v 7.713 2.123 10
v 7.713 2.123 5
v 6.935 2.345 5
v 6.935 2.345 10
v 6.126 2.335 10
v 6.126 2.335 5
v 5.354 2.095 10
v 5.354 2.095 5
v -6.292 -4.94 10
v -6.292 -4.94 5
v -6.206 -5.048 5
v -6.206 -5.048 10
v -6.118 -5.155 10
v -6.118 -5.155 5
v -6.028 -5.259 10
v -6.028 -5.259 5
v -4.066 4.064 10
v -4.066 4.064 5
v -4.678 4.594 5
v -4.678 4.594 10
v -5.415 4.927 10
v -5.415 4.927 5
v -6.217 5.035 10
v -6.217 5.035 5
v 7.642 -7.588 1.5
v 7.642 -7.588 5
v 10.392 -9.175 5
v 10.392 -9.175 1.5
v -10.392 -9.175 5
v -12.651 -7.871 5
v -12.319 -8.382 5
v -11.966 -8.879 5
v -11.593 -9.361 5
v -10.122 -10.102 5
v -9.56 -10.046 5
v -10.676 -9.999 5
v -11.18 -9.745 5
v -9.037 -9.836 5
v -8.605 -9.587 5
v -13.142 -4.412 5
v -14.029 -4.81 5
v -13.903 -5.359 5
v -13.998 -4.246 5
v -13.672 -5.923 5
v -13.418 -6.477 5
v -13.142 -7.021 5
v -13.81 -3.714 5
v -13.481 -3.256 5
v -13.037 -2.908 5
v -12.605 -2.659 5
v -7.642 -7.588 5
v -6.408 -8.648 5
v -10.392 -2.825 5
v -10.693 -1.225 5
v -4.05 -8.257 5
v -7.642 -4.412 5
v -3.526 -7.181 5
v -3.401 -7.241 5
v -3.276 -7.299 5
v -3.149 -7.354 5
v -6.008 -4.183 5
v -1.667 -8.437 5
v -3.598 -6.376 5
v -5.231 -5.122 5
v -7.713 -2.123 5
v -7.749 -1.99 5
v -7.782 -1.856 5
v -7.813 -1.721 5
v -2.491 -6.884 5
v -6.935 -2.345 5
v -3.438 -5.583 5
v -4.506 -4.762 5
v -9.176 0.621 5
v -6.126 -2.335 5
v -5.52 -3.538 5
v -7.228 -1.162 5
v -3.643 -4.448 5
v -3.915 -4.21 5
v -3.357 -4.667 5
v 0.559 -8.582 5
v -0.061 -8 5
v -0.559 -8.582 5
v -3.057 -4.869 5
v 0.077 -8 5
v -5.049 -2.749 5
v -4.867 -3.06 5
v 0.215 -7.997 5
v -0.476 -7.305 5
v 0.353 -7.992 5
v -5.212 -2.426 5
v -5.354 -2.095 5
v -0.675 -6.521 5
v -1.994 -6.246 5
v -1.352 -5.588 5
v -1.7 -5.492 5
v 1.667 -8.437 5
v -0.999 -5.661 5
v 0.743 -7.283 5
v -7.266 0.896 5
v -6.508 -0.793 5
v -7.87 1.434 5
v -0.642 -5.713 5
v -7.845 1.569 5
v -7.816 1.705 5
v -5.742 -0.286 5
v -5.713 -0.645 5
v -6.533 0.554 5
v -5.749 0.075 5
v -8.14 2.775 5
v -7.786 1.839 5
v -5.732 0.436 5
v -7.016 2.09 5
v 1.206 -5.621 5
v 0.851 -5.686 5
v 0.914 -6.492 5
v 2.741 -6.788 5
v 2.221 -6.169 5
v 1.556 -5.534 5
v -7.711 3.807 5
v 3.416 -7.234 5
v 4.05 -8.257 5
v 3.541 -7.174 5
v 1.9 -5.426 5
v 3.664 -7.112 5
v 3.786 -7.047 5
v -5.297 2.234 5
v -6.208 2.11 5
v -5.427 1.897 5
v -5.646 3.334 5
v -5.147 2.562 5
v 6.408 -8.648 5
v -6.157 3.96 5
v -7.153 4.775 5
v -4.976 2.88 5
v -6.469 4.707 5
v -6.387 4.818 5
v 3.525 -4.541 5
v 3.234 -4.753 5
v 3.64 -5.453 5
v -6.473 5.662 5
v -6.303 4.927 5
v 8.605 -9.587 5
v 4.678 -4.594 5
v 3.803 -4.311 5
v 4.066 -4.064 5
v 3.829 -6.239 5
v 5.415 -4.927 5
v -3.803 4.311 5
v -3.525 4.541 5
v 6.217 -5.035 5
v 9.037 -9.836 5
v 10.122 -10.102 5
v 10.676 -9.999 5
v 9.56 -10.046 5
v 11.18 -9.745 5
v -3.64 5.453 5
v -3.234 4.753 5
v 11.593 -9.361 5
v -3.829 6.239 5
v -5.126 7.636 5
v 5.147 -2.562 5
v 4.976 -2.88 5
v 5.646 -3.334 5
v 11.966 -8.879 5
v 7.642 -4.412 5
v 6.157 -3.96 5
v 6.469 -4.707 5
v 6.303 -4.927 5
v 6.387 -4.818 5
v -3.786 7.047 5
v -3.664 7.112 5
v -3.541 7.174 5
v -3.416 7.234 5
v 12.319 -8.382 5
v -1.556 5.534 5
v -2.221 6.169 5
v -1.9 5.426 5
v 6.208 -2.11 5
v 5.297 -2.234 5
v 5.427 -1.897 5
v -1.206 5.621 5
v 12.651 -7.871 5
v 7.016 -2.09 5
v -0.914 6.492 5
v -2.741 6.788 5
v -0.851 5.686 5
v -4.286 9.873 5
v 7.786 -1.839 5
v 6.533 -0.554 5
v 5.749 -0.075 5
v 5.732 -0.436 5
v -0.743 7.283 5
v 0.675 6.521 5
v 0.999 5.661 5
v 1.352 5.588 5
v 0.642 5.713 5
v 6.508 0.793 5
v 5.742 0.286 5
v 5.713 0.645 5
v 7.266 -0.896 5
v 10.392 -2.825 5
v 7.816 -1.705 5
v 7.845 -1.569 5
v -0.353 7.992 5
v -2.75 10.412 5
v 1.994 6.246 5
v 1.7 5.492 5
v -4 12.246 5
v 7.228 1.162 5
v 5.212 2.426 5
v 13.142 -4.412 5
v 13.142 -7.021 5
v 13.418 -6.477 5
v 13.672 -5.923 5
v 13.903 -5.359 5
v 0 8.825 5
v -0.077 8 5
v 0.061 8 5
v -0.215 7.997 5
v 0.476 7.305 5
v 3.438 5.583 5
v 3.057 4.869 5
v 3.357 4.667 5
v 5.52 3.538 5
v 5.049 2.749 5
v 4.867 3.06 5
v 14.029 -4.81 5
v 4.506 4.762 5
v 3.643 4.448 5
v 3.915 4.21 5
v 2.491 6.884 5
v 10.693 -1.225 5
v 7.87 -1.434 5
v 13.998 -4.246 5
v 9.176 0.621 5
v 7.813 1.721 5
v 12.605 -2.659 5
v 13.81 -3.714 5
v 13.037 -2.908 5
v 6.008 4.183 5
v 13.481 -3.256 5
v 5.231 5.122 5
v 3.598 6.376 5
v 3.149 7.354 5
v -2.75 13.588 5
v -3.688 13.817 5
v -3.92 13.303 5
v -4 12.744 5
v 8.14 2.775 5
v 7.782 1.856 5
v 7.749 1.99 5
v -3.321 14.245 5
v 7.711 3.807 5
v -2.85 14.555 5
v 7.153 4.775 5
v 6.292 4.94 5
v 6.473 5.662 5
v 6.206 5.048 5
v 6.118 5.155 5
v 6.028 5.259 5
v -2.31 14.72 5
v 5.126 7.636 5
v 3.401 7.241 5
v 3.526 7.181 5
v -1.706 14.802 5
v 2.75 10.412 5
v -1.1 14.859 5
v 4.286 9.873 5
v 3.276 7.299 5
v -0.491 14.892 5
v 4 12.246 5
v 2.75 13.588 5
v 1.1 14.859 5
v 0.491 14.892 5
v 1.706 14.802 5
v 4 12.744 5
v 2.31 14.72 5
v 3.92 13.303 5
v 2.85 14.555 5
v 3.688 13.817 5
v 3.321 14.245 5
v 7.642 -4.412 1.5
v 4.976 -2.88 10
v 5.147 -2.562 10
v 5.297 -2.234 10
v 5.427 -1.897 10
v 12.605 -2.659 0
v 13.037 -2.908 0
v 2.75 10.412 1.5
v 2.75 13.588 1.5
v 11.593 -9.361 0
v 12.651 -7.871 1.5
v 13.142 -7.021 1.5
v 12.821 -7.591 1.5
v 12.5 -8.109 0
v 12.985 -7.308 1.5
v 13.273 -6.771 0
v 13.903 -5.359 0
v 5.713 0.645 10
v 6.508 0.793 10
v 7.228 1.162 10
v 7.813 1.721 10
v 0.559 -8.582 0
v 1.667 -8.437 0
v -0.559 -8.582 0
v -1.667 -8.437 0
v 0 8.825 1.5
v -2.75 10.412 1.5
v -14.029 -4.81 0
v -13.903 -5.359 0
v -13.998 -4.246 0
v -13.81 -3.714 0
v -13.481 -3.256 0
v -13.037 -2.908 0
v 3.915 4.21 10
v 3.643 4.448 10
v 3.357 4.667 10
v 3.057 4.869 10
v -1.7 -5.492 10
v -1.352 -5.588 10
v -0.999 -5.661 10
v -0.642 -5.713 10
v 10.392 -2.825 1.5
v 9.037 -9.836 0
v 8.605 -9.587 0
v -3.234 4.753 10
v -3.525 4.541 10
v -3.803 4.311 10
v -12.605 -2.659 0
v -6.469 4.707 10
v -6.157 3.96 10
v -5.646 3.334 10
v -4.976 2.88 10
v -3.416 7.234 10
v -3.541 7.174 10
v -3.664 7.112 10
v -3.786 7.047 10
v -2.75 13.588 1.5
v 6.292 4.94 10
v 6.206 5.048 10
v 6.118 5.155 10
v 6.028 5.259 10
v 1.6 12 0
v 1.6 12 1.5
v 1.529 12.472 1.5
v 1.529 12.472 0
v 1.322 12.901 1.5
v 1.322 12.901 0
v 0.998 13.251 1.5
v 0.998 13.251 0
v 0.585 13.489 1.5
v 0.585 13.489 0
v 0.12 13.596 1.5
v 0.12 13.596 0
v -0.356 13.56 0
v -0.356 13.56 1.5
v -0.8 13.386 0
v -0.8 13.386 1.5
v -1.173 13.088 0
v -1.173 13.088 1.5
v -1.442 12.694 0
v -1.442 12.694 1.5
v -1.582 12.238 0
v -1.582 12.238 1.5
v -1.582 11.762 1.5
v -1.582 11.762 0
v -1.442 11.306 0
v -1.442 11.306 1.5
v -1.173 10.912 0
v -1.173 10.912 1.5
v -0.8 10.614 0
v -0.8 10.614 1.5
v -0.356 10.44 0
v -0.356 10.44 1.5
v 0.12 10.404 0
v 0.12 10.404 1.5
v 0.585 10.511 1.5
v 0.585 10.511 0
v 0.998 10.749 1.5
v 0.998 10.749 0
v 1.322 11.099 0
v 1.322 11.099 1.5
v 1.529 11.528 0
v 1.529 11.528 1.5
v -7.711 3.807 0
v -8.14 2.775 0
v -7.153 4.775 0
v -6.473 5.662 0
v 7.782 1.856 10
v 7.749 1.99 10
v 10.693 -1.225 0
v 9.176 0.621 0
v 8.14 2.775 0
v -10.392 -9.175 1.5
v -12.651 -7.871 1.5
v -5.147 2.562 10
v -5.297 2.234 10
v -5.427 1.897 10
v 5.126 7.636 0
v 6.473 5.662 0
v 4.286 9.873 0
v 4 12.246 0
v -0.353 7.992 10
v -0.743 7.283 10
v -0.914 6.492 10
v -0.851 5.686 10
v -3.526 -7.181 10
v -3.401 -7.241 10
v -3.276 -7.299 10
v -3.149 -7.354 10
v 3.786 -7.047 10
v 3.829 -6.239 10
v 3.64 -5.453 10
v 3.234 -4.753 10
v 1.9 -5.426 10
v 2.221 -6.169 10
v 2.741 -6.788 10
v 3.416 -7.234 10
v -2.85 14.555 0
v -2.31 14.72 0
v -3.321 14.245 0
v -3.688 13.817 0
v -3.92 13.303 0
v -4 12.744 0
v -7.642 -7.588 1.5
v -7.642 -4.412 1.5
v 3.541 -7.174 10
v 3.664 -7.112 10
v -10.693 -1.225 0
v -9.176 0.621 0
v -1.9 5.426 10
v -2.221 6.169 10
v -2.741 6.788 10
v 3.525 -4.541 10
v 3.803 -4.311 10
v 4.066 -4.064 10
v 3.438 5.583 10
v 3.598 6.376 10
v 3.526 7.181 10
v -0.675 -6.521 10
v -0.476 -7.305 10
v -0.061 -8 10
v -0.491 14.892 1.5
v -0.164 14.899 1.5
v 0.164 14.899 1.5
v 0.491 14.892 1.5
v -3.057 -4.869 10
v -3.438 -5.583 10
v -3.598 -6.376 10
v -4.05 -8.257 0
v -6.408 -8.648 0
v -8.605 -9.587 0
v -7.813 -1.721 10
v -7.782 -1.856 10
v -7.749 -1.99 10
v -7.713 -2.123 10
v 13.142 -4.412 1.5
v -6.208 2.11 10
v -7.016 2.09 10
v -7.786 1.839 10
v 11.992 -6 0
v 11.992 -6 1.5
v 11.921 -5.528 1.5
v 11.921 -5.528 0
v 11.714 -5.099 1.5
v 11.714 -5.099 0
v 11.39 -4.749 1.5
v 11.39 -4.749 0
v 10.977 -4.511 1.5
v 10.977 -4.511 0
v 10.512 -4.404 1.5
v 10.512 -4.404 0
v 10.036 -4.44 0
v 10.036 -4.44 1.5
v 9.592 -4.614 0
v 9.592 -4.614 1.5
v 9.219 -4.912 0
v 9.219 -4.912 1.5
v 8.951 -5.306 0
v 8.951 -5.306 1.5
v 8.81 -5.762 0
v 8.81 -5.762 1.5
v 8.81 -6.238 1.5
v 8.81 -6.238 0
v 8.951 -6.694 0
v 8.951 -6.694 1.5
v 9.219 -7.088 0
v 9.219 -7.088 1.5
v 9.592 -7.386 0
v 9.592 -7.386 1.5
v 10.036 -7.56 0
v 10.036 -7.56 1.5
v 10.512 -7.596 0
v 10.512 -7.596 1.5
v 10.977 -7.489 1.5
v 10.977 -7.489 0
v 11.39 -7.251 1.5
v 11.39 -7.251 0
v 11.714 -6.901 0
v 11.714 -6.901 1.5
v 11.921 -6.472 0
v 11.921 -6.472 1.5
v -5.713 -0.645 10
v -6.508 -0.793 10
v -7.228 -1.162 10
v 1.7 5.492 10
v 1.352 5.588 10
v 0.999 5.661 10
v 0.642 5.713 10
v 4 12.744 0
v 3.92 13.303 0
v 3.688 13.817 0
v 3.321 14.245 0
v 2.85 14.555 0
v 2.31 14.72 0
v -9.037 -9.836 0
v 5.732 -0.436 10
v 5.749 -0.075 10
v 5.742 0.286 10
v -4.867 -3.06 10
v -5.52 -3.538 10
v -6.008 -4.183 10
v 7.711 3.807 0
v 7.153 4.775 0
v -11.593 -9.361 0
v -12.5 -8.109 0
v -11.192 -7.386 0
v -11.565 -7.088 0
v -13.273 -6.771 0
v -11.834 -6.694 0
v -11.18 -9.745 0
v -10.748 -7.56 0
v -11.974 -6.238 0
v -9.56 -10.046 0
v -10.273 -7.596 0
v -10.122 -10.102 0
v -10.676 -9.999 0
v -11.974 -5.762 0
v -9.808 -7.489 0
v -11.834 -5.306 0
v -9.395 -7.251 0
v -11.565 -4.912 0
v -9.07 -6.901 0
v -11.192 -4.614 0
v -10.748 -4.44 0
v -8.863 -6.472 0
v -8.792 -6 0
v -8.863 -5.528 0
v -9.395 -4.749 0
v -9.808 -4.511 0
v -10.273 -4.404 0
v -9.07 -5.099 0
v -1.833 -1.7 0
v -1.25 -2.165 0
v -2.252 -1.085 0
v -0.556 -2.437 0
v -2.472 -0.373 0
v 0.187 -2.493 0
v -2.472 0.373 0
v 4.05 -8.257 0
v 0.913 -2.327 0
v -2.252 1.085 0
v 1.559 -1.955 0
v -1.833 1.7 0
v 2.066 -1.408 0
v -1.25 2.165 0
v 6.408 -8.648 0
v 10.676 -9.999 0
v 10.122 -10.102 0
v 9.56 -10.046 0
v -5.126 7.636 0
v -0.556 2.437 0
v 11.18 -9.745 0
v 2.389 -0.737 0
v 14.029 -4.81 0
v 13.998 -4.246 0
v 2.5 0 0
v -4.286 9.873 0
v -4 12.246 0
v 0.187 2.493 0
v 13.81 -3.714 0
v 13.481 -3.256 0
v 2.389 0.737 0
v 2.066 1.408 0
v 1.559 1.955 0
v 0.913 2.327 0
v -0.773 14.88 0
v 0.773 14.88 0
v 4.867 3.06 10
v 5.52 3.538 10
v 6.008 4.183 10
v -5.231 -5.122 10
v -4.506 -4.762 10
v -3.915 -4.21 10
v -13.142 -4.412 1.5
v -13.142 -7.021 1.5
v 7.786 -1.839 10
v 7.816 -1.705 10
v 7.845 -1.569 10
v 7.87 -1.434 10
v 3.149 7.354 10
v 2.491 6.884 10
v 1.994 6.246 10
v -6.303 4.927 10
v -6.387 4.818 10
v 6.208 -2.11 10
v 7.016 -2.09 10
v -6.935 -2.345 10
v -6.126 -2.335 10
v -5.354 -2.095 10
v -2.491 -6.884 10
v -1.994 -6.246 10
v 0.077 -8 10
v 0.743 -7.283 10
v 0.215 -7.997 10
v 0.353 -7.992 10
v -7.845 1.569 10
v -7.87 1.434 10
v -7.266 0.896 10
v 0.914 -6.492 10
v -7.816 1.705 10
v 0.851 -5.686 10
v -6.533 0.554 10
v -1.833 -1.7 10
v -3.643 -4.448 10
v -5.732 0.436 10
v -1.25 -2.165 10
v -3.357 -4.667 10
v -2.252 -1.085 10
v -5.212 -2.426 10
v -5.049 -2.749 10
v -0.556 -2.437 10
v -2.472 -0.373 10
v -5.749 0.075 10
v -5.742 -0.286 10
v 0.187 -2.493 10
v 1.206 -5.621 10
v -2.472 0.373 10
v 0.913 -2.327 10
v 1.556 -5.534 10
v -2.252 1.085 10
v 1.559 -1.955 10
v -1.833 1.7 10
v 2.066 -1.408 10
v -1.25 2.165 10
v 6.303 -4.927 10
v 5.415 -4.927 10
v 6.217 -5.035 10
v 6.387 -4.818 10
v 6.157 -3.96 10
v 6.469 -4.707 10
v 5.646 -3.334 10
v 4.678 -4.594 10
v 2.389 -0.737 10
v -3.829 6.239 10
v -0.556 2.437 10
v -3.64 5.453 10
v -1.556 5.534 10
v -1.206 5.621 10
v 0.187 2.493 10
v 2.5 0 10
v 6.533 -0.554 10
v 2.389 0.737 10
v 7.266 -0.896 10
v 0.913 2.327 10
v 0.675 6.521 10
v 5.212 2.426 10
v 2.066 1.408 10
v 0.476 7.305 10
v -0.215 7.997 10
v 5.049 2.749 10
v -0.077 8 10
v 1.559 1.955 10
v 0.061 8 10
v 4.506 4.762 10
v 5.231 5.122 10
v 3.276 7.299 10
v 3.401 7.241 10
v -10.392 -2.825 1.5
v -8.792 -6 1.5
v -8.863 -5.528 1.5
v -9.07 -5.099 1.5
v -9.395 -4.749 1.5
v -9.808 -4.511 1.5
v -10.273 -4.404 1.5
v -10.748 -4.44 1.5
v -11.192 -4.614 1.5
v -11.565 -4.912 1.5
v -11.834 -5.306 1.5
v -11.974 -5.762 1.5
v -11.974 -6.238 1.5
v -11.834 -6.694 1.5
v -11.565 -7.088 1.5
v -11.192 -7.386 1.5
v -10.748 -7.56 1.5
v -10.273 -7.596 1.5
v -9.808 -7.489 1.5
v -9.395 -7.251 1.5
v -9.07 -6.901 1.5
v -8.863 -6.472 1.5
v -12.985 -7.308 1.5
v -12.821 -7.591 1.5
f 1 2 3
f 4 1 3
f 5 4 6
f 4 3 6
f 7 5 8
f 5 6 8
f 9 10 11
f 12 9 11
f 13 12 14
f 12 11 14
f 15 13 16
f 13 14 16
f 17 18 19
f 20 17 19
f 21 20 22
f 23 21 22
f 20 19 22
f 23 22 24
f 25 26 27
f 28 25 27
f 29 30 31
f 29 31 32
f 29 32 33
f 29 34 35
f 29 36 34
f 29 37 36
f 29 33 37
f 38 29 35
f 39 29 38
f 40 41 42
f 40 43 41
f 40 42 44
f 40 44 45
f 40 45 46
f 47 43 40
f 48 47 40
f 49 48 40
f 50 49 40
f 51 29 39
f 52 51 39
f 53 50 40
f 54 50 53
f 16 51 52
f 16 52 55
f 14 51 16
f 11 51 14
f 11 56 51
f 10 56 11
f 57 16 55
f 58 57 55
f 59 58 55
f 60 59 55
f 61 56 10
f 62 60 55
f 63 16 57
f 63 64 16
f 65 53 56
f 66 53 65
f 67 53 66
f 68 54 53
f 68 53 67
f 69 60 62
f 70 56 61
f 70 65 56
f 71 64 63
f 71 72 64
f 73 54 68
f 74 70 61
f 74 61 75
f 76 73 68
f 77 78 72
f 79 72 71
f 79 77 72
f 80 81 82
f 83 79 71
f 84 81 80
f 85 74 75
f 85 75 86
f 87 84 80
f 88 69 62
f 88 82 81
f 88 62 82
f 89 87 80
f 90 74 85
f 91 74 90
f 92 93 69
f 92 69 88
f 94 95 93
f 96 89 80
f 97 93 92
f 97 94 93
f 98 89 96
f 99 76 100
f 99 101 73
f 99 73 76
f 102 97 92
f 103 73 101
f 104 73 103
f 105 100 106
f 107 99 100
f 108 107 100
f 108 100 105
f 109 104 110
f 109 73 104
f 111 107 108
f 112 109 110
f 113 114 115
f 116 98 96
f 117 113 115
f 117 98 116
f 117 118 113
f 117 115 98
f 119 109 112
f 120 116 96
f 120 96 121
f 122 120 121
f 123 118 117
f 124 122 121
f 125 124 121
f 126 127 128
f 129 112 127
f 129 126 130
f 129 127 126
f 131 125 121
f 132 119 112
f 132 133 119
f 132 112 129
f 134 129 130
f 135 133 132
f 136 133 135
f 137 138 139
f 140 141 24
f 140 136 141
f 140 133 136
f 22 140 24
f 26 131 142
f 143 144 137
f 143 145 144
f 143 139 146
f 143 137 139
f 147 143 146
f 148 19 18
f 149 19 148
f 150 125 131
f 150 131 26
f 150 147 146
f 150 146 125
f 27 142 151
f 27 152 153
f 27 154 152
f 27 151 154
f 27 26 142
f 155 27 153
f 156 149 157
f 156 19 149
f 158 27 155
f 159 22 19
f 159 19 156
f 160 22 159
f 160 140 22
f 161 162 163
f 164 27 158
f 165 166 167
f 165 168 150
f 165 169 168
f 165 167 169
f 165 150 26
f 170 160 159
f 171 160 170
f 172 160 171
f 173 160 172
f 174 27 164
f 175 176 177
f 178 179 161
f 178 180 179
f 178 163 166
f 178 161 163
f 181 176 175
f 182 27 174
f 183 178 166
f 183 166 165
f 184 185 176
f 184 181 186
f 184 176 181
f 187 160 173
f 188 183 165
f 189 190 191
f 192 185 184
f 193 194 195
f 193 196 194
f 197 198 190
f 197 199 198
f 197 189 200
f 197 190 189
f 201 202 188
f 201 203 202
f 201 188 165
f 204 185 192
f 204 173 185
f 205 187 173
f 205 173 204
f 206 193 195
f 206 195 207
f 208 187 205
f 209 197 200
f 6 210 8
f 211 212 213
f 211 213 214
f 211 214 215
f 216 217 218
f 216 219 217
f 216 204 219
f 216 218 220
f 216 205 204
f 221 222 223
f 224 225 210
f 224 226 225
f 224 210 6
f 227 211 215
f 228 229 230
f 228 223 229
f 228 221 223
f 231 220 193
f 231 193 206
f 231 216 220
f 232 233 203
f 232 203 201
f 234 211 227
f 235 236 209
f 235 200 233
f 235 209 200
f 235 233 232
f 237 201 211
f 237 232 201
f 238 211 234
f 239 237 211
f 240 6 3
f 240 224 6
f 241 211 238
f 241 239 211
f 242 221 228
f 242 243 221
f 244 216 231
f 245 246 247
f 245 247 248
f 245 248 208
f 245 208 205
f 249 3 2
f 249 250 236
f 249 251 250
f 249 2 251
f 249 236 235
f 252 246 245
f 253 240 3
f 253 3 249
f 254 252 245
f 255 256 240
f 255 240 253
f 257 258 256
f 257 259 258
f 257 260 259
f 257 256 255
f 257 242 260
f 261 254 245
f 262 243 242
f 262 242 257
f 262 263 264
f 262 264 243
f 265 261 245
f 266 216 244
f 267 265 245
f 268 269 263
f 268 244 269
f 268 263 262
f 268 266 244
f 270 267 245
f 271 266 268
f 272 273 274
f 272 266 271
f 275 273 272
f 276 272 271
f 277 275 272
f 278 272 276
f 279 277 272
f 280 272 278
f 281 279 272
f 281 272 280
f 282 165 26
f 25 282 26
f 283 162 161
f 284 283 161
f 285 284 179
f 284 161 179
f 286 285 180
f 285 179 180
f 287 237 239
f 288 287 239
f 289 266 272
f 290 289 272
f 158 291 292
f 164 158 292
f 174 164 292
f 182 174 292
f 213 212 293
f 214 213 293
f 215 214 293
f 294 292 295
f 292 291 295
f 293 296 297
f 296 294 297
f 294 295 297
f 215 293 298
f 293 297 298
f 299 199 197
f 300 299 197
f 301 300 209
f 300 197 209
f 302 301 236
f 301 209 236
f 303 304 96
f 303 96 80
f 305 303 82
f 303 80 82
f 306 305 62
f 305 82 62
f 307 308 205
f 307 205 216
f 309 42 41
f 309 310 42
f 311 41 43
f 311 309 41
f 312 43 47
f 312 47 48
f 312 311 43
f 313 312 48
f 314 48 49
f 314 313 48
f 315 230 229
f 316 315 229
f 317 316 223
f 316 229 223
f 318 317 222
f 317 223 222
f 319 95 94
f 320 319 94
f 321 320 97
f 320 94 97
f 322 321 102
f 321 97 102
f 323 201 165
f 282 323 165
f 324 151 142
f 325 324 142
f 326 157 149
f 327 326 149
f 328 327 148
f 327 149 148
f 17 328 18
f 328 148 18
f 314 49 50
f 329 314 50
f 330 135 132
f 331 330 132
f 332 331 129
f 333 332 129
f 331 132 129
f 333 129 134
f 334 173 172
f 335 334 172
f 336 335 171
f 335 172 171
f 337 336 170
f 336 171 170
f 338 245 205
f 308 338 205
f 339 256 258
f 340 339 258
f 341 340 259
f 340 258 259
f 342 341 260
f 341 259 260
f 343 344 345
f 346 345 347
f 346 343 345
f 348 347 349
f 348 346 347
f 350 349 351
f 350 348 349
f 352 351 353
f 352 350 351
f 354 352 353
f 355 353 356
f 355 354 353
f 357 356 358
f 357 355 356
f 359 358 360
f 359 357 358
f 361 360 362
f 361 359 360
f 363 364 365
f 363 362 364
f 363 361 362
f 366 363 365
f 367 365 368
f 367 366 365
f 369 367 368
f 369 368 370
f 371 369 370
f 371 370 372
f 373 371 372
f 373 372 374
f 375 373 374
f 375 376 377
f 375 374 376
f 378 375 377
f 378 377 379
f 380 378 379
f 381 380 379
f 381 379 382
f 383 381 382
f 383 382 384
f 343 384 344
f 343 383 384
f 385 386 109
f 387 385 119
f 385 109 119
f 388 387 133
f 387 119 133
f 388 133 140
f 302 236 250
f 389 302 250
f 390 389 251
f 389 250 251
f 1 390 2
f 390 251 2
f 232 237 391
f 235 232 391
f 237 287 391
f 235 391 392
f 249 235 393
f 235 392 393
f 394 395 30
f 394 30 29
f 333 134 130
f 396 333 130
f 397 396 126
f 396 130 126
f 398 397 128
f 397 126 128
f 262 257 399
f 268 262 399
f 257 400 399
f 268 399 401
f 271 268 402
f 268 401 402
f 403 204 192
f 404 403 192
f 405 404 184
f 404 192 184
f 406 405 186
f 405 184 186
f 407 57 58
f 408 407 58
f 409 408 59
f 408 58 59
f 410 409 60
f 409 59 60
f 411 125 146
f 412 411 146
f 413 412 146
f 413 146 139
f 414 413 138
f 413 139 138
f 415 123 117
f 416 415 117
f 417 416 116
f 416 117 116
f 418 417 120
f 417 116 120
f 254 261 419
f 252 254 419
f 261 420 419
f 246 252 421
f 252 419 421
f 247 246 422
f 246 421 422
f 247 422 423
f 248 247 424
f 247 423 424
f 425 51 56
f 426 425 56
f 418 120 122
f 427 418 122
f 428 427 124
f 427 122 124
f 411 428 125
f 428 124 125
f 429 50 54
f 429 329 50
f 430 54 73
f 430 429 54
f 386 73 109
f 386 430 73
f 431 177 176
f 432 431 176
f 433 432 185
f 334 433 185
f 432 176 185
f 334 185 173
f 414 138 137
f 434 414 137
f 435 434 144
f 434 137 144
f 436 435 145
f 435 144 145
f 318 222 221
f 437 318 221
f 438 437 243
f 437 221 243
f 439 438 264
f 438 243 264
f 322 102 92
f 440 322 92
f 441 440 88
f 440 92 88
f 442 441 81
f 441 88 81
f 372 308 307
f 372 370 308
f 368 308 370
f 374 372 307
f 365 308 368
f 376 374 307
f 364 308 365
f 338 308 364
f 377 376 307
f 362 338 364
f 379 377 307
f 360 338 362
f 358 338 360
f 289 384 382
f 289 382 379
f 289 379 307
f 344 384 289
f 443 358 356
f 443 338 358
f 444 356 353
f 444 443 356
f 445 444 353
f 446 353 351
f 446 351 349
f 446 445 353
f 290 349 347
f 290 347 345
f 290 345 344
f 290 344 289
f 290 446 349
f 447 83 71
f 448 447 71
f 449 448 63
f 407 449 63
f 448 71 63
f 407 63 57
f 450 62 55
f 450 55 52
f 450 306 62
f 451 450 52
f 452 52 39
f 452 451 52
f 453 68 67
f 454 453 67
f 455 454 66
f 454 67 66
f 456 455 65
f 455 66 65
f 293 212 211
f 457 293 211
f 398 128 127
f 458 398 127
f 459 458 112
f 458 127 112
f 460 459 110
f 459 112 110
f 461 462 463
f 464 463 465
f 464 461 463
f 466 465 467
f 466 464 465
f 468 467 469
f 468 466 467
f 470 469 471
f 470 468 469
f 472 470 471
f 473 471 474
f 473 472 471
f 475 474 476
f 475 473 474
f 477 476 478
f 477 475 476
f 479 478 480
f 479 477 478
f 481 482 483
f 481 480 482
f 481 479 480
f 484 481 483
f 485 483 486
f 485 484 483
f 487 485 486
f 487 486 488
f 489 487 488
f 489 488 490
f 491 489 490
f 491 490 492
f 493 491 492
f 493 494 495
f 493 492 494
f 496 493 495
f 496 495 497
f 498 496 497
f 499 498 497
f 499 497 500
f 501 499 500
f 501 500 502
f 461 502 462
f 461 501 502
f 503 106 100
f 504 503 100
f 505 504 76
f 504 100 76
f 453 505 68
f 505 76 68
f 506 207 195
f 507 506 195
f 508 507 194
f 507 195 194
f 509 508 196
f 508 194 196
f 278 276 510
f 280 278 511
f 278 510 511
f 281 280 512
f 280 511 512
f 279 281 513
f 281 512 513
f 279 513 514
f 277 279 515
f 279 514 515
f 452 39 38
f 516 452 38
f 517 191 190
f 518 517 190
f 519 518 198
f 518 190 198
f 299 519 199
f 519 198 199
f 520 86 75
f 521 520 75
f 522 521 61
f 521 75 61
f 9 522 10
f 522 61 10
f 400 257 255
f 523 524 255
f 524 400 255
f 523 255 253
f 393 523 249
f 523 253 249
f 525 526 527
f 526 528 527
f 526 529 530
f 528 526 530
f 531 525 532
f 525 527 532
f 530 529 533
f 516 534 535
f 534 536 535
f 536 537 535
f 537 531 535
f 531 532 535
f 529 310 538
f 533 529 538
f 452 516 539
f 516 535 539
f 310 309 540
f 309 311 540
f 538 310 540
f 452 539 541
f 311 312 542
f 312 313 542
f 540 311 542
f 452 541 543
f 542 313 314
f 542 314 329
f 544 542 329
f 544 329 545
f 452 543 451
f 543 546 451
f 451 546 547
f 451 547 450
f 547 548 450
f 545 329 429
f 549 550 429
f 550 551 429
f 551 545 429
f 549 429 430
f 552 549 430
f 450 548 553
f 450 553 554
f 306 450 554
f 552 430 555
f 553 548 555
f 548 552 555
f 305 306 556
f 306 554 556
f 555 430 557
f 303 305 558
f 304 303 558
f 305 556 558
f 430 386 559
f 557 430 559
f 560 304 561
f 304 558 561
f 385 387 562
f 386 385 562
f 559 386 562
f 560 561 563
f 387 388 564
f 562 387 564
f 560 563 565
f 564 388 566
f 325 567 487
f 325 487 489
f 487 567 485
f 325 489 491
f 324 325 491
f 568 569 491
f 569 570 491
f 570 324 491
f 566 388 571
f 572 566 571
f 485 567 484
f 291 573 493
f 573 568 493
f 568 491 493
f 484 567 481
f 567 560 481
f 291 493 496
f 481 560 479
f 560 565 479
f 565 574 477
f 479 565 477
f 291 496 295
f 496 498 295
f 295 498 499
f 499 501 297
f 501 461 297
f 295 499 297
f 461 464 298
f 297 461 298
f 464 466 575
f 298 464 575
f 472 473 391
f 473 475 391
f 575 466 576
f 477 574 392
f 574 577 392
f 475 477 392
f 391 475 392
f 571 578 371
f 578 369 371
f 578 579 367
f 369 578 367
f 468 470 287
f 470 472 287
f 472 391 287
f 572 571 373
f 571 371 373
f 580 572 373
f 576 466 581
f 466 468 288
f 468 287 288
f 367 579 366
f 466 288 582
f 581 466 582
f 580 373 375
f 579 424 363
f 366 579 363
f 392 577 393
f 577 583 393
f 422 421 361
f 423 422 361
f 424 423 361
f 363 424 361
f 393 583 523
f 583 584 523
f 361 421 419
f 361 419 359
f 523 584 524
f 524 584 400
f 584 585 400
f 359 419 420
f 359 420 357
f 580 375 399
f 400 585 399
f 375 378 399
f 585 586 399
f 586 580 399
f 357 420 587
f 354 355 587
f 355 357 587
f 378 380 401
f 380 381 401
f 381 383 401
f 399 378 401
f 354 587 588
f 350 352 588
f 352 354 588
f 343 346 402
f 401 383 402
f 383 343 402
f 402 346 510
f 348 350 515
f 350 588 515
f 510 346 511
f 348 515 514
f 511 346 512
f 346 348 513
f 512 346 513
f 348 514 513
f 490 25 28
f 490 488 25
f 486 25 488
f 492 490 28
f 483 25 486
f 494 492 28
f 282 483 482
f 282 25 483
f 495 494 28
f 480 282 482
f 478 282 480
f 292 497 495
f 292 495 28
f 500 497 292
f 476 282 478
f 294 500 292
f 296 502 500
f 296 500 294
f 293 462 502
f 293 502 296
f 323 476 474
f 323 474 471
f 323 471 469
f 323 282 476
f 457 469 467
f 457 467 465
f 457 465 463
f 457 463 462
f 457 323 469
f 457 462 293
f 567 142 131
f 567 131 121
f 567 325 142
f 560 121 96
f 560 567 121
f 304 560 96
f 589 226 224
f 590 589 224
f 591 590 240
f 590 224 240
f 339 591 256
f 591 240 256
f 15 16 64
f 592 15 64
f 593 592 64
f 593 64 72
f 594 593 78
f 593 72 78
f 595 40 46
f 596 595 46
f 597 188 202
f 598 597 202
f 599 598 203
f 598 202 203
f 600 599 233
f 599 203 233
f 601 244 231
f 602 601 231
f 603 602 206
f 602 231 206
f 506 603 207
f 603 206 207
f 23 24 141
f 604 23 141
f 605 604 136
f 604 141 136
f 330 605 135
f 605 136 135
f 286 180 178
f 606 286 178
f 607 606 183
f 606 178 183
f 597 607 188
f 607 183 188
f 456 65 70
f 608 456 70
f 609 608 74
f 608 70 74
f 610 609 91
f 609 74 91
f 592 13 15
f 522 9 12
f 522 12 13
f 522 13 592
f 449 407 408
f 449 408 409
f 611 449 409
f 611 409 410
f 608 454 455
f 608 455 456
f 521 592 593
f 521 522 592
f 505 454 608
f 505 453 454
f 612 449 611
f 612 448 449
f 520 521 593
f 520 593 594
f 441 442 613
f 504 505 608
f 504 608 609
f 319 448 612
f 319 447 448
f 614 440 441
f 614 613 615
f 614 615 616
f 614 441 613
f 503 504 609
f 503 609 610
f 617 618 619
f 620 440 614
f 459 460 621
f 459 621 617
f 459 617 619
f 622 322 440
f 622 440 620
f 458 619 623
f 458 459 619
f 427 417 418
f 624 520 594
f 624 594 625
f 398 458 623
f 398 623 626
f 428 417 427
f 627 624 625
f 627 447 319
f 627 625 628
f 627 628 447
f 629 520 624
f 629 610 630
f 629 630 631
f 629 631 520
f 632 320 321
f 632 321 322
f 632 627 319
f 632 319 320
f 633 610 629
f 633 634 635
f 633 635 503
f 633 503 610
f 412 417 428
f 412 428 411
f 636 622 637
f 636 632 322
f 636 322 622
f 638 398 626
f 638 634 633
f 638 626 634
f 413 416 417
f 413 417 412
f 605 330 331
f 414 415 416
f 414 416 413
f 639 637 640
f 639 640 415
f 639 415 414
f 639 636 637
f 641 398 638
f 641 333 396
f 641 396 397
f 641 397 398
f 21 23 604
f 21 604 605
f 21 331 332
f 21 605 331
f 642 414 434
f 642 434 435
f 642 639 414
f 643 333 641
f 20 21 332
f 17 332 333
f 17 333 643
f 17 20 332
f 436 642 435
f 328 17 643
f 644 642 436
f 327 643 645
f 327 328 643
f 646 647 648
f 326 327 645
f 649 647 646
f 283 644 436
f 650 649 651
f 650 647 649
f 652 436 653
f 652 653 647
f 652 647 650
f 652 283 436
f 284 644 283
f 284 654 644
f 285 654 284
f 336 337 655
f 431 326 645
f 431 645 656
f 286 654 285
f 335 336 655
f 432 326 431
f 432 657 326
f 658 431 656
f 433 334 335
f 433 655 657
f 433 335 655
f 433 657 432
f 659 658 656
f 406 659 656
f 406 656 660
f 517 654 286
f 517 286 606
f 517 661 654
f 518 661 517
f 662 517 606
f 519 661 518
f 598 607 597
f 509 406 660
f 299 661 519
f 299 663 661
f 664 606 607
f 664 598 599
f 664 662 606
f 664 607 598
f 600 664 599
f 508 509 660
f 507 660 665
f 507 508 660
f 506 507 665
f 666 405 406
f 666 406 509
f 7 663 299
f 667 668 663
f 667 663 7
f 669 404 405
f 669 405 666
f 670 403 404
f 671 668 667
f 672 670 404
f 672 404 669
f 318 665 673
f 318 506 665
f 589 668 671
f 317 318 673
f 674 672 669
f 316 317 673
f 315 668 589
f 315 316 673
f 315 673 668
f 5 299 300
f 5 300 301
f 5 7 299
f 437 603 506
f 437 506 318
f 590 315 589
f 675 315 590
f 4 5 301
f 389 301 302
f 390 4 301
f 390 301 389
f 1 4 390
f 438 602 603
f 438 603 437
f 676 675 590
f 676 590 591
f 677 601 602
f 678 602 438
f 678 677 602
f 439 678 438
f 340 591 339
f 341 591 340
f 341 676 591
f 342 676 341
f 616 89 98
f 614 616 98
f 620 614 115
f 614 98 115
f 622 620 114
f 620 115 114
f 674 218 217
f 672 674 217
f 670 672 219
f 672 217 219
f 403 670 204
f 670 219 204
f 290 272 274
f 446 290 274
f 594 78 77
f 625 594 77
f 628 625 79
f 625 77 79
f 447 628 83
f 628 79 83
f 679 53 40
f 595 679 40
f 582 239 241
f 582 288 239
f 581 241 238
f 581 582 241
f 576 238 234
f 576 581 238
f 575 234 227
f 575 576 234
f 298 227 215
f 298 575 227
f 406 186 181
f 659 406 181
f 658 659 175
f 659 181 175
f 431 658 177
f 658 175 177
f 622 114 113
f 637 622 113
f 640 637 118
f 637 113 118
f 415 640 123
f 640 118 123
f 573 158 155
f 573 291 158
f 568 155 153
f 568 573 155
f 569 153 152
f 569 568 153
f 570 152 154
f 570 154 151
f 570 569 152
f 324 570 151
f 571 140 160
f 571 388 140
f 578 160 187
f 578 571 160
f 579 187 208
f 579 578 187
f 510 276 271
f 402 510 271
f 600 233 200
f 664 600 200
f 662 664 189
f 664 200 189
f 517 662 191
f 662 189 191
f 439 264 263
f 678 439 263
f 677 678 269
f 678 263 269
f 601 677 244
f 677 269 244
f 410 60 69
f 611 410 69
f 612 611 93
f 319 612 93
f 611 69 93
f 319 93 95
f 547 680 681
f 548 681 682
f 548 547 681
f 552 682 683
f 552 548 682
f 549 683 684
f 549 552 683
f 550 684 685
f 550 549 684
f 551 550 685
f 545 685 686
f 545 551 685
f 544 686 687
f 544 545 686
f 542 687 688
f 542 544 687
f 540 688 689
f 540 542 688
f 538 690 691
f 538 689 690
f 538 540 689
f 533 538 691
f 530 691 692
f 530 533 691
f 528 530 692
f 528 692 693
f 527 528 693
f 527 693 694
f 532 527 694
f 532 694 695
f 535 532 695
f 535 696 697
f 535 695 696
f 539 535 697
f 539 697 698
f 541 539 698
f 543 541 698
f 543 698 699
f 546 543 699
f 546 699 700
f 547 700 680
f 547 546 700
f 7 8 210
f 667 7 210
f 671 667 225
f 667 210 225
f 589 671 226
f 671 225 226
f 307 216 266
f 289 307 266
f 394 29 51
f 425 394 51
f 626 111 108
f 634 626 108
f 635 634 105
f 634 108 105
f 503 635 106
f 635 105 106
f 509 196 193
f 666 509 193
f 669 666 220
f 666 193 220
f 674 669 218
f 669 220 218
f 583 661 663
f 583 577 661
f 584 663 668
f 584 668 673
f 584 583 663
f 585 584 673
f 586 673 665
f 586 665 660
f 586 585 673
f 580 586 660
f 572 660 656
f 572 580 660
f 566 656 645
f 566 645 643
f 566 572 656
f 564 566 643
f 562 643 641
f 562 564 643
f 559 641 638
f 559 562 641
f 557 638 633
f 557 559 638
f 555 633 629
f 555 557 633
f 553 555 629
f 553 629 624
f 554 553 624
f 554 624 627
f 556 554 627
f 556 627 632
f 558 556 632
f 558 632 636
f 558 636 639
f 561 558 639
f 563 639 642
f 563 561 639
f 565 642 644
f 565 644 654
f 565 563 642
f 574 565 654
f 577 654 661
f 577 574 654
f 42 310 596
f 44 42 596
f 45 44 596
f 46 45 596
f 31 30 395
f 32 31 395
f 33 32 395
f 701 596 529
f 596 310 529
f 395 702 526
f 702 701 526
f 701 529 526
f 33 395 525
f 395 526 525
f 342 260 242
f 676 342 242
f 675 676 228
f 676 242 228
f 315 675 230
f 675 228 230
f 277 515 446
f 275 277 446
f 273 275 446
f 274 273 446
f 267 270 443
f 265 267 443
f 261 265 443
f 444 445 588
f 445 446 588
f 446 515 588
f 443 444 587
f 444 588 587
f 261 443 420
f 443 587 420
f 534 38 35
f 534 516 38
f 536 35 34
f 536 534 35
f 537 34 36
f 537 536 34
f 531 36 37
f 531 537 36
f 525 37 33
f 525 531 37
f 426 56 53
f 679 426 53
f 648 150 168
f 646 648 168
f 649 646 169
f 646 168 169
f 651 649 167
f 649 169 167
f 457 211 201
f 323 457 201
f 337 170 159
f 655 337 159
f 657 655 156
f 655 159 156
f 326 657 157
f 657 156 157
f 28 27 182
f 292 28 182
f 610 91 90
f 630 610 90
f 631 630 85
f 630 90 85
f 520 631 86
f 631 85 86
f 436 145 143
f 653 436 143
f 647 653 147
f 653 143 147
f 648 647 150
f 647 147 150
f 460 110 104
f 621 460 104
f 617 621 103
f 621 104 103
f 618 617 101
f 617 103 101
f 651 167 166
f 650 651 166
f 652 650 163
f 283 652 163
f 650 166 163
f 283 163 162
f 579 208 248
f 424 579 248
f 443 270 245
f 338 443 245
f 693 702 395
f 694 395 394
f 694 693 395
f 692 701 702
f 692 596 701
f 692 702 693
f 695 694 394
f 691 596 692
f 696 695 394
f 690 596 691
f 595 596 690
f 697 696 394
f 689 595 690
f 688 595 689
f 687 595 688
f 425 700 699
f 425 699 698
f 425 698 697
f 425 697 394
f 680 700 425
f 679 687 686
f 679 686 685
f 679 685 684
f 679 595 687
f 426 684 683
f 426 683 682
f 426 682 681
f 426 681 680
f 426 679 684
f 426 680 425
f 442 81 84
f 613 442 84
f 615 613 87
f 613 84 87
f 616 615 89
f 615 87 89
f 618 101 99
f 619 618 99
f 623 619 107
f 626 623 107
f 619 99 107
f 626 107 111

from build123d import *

# Parameters (mm, degrees)
SKETCH1_R           = 14.9
SKETCH1_R_2         = 1.6000000000000003
SKETCH1_R_3         = 1.6000000000006653
SKETCH1_R_4         = 1.6000000000009684
SKETCH1_R_5         = 2.5
BOSS_EXTRUDE1_DEPTH = 5
CUT_EXTRUDE1_DEPTH  = 3.5
CUT_EXTRUDE2_DEPTH  = 22.656869579881576
FILLET1_R           = 10
FILLET2_R           = 2
SKETCH6_R           = 2.4999999999999956
BOSS_EXTRUDE2_DEPTH = 5


with BuildPart() as part:
    # Sketch1 → Boss-Extrude1 (new body)
    with BuildSketch(Plane.XY):
        Circle(SKETCH1_R)
        with Locations((0, 12)):
            Circle(SKETCH1_R_2, mode=Mode.SUBTRACT)
        with Locations((10.392304845414033, -5.99999999999955)):
            Circle(SKETCH1_R_3, mode=Mode.SUBTRACT)
        with Locations((-10.3923048454125, -6.000000000000447)):
            Circle(SKETCH1_R_4, mode=Mode.SUBTRACT)
        Circle(SKETCH1_R_5, mode=Mode.SUBTRACT)
    extrude(amount=BOSS_EXTRUDE1_DEPTH)

    # Sketch2 → Cut-Extrude1 (cut)
    with BuildSketch(Plane.XY.offset(5)):
        Polygon((13.142304845413232, -7.5877132402708165), (13.142304845413246, -4.412286759728591), (10.392304845413825, -2.824573519457418), (7.642304845414409, -4.41228675972855), (7.64230484541441, -7.587713240270817), (10.39230484541382, -9.17542648054195), align=None)
        Polygon((1.342e-14, 15.175426480542264), (-2.749999999999405, 13.58771324027113), (-2.7499999999994076, 10.412286759728874), (9e-15, 8.824573519457736), (2.7499999999994245, 10.41228675972887), (2.7499999999994267, 13.58771324027113), align=None)
        Polygon((-13.14230484541212, -7.587713240271449), (-10.3923048454127, -9.175426480542583), (-7.642304845413332, -7.587713240271399), (-7.642304845413293, -4.412286759729188), (-10.392304845412706, -2.8245735194580552), (-13.142304845412118, -4.4122867597291835), align=None)
    extrude(amount=-CUT_EXTRUDE1_DEPTH, mode=Mode.SUBTRACT)

    # Sketch5 → Cut-Extrude2 (cut, through all)
    with BuildSketch(Plane.XY.offset(5)):
        with BuildLine():
            Line((4, 14.353048456686821), (4, 7.613146524269713))
            ThreePointArc((4, 7.613146524269714), (7.360706487831178, 4.447471191587419), (8.600000000000001, 0))
            ThreePointArc((8.600000000000001, 0), (8.598294404056443, -0.17126979059858147), (8.593178292750771, -0.3424716469971399))
            Line((8.593178292750771, -0.3424716469971399), (14.430104585239802, -3.712422613205722))
            ThreePointArc((14.430104585239803, -3.712422613205722), (12.903778516388154, 7.44999999999997), (4.000000000000001, 14.353048456686825))
        make_face()
        with BuildLine():
            Line((-14.43010458523985, -3.712422613205522), (-8.593178292750776, -0.3424716469970228))
            ThreePointArc((-8.593178292750778, -0.3424716469970228), (-7.447818472546155, 4.300000000000037), (-4.000000000000002, 7.613146524269715))
            Line((-4, 7.613146524269713), (-4, 14.353048456686821))
            ThreePointArc((-3.9999999999999996, 14.35304845668682), (-12.903778516388101, 7.450000000000059), (-14.43010458523985, -3.712422613205523))
        make_face()
        with BuildLine():
            ThreePointArc((4.593178292750738, -7.270674877272635), (-6.195e-14, -8.6), (-4.593178292750841, -7.270674877272569))
            Line((-4.59317829275084, -7.270674877272568), (-10.43010458523992, -10.640625843481063))
            ThreePointArc((-10.430104585239919, -10.640625843481068), (-1.0303e-13, -14.899999999999999), (10.430104585239771, -10.640625843481217))
            Line((10.430104585239768, -10.640625843481212), (4.593178292750737, -7.270674877272635))
        make_face()
    extrude(amount=-CUT_EXTRUDE2_DEPTH, mode=Mode.SUBTRACT)

    # Fillet1
    fillet1_edges = [part.edges().sort_by_distance(p)[0] for p in [
        (4.593178292750738, -7.270674877272635, 2.5),
        (-4.593178292750841, -7.270674877272569, 2.5),
        (-4.000000000000001, 7.613146524269714, 2.5),
        (-8.593178292750778, -0.3424716469970228, 2.5),
        (4.000000000000001, 7.613146524269715, 2.5),
        (8.593178292750771, -0.3424716469971399, 2.5),
    ]]
    fillet(fillet1_edges, radius=FILLET1_R)

    # Fillet2
    fillet2_edges = [part.edges().sort_by_distance(p)[0] for p in [
        (10.430104585239771, -10.640625843481214, 2.5),
        (-10.43010458523992, -10.640625843481068, 2.5),
        (-14.43010458523985, -3.7124226132055225, 2.5),
        (-4, 14.353048456686821, 2.5),
        (4, 14.353048456686823, 2.5),
        (14.430104585239803, -3.712422613205722, 2.5),
    ]]
    fillet(fillet2_edges, radius=FILLET2_R)

    # Sketch6 → Boss-Extrude2 (add)
    with BuildSketch(Plane.XY.offset(5)):
        with BuildLine():
            ThreePointArc((6.02817063707193, 5.259387680171888), (4.855499076696584, 4.968349486507053), (3.914637171074405, 4.2102988989907315))
            ThreePointArc((3.914637171074405, 4.2102988989907315), (3.5015459862118337, 4.559624623414058), (3.0574479574494795, 4.868574019924936))
            ThreePointArc((3.0574479574494795, 4.868574019924936), (3.547016405974829, 5.9731936616538555), (3.5255692044436264, 7.181250711726956))
            ThreePointArc((3.5255692044436264, 7.181250711726956), (3.3385186822805317, 7.270095804600103), (3.1492312822635022, 7.354069780115842))
            ThreePointArc((3.1492312822635022, 7.354069780115842), (2.2189674537840838, 6.583050306880795), (1.7001859911750001, 5.491845645628829))
            ThreePointArc((1.7001859911750001, 5.491845645628829), (1.1764369425261552, 5.627343700207033), (0.6422703249581851, 5.713010574966424))
            ThreePointArc((0.6422703249581851, 5.713010574966424), (0.6040797553307691, 6.9206542720378605), (0.06060018449448659, 7.999770472809791))
            ThreePointArc((0.06060018449448659, 7.999770472809791), (-0.1464749537974085, 7.998658955594381), (-0.3534519507842858, 7.992188168360838))
            ThreePointArc((-0.3534519507842858, 7.992188168360838), (-0.8570578872002823, 6.893897278163069), (-0.8510078756894319, 5.685665009083339))
            ThreePointArc((-0.8510078756894319, 5.685665009083339), (-1.3816798656790947, 5.580498342332617), (-1.9001168223196914, 5.425915320159152))
            ThreePointArc((-1.9001168223196914, 5.425915320159152), (-2.4585022994085572, 6.497394427590124), (-3.4163714452062757, 7.233837581006314))
            ThreePointArc((-3.4163714452062757, 7.233837581006314), (-3.6024574288783424, 7.14298960331872), (-3.7861296901755246, 7.047355672106486))
            ThreePointArc((-3.7861296901755246, 7.047355672106486), (-3.7633324024994224, 5.8393233454034945), (-3.233649195846893, 4.753368687383592))
            ThreePointArc((-3.233649195846893, 4.753368687383592), (-3.6661380312950715, 4.428366847438451), (-4.066162529533613, 4.064150991709943))
            ThreePointArc((-4.066162529533613, 4.064150991709943), (-5.034147822198015, 4.787245931444861), (-6.216688811137787, 5.035154439088672))
            ThreePointArc((-6.216688811137787, 5.035154439088672), (-6.344929028928957, 4.8725635570872505), (-6.468918010594077, 4.7067079548461095))
            ThreePointArc((-6.468918010594077, 4.7067079548461095), (-5.9242327812405176, 3.628199809485637), (-4.975826634662063, 2.879609400906265))
            ThreePointArc((-4.975826634662063, 2.879609400906265), (-5.224472597580759, 2.3991429880538346), (-5.426854879562582, 1.897431715811644))
            ThreePointArc((-5.426854879562582, 1.897431715811644), (-6.61271862902979, 2.1289246668585444), (-7.785714715338611, 1.8391972083928103))
            ThreePointArc((-7.785714715338611, 1.8391972083928103), (-7.83070961935227, 1.637066540304308), (-7.8704577829414815, 1.4338390031436454))
            ThreePointArc((-7.8704577829414815, 1.4338390031436454), (-6.911766201709898, 0.6984668043486959), (-5.7324805839734525, 0.43550815648784985))
            ThreePointArc((-5.7324805839734525, 0.43550815648784985), (-5.748036291964011, -0.1052605636725878), (-5.712692064686818, -0.6450971818759339))
            ThreePointArc((-5.712692064686818, -0.6450971818759339), (-6.881559411710404, -0.9510562375466041), (-7.812684334641904, -1.7210355856986488))
            ThreePointArc((-7.812684334641904, -1.7210355856986488), (-7.765522132311889, -1.9226715820894416), (-7.713156866547124, -2.1230193480128765))
            ThreePointArc((-7.713156866547124, -2.1230193480128765), (-6.530339558681069, -2.3696061175227916), (-5.353746449368295, -2.0948508194800826))
            ThreePointArc((-5.353746449368295, -2.0948508194800826), (-5.1331309036849415, -2.5888159698276345), (-4.867060524829484, -3.059856671095323))
            ThreePointArc((-4.867060524829484, -3.059856671095323), (-5.78742295611416, -3.842668790166433), (-6.292256005183971, -4.940396174926289))
            ThreePointArc((-6.292256005183971, -4.940396174926289), (-6.162277749088176, -5.101601017630917), (-6.028170637071975, -5.259387680171835))
            ThreePointArc((-6.028170637071975, -5.259387680171835), (-4.855499076696629, -4.968349486507008), (-3.9146371710744448, -4.210298898990695))
            ThreePointArc((-3.9146371710744448, -4.210298898990695), (-3.5015459862118763, -4.559624623414024), (-3.0574479574495212, -4.868574019924903))
            ThreePointArc((-3.0574479574495212, -4.868574019924903), (-3.5470164059748766, -5.973193661653813), (-3.525569204443685, -7.1812507117269115))
            ThreePointArc((-3.525569204443685, -7.1812507117269115), (-3.338518682280587, -7.2700958046000626), (-3.1492312822635578, -7.35406978011581))
            ThreePointArc((-3.1492312822635578, -7.35406978011581), (-2.218967453784133, -6.583050306880769), (-1.700185991175043, -5.491845645628806))
            ThreePointArc((-1.700185991175043, -5.491845645628806), (-1.176436942526202, -5.627343700207011), (-0.6422703249582338, -5.713010574966406))
            ThreePointArc((-0.6422703249582338, -5.713010574966406), (-0.6040797553308295, -6.920654272037842), (-0.06060018449455164, -7.999770472809773))
            ThreePointArc((-0.06060018449455164, -7.999770472809773), (0.14647495379734404, -7.998658955594365), (0.35345195078422115, -7.9921881683608245))
            ThreePointArc((0.35345195078422115, -7.9921881683608245), (0.8570578872002264, -6.893897278163062), (0.8510078756893855, -5.6856650090833325))
            ThreePointArc((0.8510078756893855, -5.6856650090833325), (1.3816798656790477, -5.580498342332614), (1.900116822319644, -5.425915320159157))
            ThreePointArc((1.900116822319644, -5.425915320159157), (2.458502299408505, -6.497394427590132), (3.416371445206218, -7.23383758100633))
            ThreePointArc((3.416371445206218, -7.23383758100633), (3.6024574288782856, -7.142989603318738), (3.7861296901754686, -7.047355672106509))
            ThreePointArc((3.7861296901754686, -7.047355672106509), (3.7633324024993775, -5.839323345403511), (3.2336491958468514, -4.753368687383601))
            ThreePointArc((3.2336491958468514, -4.753368687383601), (3.6661380312950302, -4.428366847438464), (4.066162529533574, -4.064150991709959))
            ThreePointArc((4.066162529533574, -4.064150991709959), (5.034147822197974, -4.7872459314448825), (6.216688811137743, -5.035154439088707))
            ThreePointArc((6.216688811137743, -5.035154439088707), (6.344929028928913, -4.872563557087289), (6.468918010594035, -4.706707954846148))
            ThreePointArc((6.468918010594035, -4.706707954846148), (5.924232781240482, -3.628199809485669), (4.975826634662032, -2.8796094009062863))
            ThreePointArc((4.975826634662032, -2.8796094009062863), (5.224472597580731, -2.3991429880538595), (5.426854879562554, -1.8974317158116716))
            ThreePointArc((5.426854879562554, -1.8974317158116716), (6.6127186290297635, -2.128924666858581), (7.7857147153385915, -1.8391972083928554))
            ThreePointArc((7.7857147153385915, -1.8391972083928554), (7.830709619352263, -1.6370665403042963), (7.870457782941487, -1.433839003143578))
            ThreePointArc((7.870457782941487, -1.433839003143578), (6.911766201709897, -0.6984668043486324), (5.732480583973447, -0.435508156487793))
            ThreePointArc((5.732480583973447, -0.435508156487793), (5.748036291964002, 0.10526056367264261), (5.7126920646868085, 0.6450971818759847))
            ThreePointArc((5.7126920646868085, 0.6450971818759847), (6.881559411710389, 0.9510562375466631), (7.81268433464188, 1.7210355856987143))
            ThreePointArc((7.81268433464188, 1.7210355856987143), (7.7655221323118635, 1.9226715820895108), (7.713156866547099, 2.123019348012948))
            ThreePointArc((7.713156866547099, 2.123019348012948), (6.530339558681042, 2.3696061175228524), (5.35374644936827, 2.094850819480135))
            ThreePointArc((5.35374644936827, 2.094850819480135), (5.133130903684914, 2.5888159698276865), (4.8670605248294505, 3.059856671095373))
            ThreePointArc((4.8670605248294505, 3.059856671095373), (5.787422956114117, 3.8426687901664893), (6.29225600518392, 4.940396174926349))
            ThreePointArc((6.29225600518392, 4.940396174926349), (6.162277749088128, 5.101601017630973), (6.02817063707193, 5.259387680171888))
        make_face()
        Circle(SKETCH6_R, mode=Mode.SUBTRACT)
    extrude(amount=BOSS_EXTRUDE2_DEPTH)


solid = part.part
